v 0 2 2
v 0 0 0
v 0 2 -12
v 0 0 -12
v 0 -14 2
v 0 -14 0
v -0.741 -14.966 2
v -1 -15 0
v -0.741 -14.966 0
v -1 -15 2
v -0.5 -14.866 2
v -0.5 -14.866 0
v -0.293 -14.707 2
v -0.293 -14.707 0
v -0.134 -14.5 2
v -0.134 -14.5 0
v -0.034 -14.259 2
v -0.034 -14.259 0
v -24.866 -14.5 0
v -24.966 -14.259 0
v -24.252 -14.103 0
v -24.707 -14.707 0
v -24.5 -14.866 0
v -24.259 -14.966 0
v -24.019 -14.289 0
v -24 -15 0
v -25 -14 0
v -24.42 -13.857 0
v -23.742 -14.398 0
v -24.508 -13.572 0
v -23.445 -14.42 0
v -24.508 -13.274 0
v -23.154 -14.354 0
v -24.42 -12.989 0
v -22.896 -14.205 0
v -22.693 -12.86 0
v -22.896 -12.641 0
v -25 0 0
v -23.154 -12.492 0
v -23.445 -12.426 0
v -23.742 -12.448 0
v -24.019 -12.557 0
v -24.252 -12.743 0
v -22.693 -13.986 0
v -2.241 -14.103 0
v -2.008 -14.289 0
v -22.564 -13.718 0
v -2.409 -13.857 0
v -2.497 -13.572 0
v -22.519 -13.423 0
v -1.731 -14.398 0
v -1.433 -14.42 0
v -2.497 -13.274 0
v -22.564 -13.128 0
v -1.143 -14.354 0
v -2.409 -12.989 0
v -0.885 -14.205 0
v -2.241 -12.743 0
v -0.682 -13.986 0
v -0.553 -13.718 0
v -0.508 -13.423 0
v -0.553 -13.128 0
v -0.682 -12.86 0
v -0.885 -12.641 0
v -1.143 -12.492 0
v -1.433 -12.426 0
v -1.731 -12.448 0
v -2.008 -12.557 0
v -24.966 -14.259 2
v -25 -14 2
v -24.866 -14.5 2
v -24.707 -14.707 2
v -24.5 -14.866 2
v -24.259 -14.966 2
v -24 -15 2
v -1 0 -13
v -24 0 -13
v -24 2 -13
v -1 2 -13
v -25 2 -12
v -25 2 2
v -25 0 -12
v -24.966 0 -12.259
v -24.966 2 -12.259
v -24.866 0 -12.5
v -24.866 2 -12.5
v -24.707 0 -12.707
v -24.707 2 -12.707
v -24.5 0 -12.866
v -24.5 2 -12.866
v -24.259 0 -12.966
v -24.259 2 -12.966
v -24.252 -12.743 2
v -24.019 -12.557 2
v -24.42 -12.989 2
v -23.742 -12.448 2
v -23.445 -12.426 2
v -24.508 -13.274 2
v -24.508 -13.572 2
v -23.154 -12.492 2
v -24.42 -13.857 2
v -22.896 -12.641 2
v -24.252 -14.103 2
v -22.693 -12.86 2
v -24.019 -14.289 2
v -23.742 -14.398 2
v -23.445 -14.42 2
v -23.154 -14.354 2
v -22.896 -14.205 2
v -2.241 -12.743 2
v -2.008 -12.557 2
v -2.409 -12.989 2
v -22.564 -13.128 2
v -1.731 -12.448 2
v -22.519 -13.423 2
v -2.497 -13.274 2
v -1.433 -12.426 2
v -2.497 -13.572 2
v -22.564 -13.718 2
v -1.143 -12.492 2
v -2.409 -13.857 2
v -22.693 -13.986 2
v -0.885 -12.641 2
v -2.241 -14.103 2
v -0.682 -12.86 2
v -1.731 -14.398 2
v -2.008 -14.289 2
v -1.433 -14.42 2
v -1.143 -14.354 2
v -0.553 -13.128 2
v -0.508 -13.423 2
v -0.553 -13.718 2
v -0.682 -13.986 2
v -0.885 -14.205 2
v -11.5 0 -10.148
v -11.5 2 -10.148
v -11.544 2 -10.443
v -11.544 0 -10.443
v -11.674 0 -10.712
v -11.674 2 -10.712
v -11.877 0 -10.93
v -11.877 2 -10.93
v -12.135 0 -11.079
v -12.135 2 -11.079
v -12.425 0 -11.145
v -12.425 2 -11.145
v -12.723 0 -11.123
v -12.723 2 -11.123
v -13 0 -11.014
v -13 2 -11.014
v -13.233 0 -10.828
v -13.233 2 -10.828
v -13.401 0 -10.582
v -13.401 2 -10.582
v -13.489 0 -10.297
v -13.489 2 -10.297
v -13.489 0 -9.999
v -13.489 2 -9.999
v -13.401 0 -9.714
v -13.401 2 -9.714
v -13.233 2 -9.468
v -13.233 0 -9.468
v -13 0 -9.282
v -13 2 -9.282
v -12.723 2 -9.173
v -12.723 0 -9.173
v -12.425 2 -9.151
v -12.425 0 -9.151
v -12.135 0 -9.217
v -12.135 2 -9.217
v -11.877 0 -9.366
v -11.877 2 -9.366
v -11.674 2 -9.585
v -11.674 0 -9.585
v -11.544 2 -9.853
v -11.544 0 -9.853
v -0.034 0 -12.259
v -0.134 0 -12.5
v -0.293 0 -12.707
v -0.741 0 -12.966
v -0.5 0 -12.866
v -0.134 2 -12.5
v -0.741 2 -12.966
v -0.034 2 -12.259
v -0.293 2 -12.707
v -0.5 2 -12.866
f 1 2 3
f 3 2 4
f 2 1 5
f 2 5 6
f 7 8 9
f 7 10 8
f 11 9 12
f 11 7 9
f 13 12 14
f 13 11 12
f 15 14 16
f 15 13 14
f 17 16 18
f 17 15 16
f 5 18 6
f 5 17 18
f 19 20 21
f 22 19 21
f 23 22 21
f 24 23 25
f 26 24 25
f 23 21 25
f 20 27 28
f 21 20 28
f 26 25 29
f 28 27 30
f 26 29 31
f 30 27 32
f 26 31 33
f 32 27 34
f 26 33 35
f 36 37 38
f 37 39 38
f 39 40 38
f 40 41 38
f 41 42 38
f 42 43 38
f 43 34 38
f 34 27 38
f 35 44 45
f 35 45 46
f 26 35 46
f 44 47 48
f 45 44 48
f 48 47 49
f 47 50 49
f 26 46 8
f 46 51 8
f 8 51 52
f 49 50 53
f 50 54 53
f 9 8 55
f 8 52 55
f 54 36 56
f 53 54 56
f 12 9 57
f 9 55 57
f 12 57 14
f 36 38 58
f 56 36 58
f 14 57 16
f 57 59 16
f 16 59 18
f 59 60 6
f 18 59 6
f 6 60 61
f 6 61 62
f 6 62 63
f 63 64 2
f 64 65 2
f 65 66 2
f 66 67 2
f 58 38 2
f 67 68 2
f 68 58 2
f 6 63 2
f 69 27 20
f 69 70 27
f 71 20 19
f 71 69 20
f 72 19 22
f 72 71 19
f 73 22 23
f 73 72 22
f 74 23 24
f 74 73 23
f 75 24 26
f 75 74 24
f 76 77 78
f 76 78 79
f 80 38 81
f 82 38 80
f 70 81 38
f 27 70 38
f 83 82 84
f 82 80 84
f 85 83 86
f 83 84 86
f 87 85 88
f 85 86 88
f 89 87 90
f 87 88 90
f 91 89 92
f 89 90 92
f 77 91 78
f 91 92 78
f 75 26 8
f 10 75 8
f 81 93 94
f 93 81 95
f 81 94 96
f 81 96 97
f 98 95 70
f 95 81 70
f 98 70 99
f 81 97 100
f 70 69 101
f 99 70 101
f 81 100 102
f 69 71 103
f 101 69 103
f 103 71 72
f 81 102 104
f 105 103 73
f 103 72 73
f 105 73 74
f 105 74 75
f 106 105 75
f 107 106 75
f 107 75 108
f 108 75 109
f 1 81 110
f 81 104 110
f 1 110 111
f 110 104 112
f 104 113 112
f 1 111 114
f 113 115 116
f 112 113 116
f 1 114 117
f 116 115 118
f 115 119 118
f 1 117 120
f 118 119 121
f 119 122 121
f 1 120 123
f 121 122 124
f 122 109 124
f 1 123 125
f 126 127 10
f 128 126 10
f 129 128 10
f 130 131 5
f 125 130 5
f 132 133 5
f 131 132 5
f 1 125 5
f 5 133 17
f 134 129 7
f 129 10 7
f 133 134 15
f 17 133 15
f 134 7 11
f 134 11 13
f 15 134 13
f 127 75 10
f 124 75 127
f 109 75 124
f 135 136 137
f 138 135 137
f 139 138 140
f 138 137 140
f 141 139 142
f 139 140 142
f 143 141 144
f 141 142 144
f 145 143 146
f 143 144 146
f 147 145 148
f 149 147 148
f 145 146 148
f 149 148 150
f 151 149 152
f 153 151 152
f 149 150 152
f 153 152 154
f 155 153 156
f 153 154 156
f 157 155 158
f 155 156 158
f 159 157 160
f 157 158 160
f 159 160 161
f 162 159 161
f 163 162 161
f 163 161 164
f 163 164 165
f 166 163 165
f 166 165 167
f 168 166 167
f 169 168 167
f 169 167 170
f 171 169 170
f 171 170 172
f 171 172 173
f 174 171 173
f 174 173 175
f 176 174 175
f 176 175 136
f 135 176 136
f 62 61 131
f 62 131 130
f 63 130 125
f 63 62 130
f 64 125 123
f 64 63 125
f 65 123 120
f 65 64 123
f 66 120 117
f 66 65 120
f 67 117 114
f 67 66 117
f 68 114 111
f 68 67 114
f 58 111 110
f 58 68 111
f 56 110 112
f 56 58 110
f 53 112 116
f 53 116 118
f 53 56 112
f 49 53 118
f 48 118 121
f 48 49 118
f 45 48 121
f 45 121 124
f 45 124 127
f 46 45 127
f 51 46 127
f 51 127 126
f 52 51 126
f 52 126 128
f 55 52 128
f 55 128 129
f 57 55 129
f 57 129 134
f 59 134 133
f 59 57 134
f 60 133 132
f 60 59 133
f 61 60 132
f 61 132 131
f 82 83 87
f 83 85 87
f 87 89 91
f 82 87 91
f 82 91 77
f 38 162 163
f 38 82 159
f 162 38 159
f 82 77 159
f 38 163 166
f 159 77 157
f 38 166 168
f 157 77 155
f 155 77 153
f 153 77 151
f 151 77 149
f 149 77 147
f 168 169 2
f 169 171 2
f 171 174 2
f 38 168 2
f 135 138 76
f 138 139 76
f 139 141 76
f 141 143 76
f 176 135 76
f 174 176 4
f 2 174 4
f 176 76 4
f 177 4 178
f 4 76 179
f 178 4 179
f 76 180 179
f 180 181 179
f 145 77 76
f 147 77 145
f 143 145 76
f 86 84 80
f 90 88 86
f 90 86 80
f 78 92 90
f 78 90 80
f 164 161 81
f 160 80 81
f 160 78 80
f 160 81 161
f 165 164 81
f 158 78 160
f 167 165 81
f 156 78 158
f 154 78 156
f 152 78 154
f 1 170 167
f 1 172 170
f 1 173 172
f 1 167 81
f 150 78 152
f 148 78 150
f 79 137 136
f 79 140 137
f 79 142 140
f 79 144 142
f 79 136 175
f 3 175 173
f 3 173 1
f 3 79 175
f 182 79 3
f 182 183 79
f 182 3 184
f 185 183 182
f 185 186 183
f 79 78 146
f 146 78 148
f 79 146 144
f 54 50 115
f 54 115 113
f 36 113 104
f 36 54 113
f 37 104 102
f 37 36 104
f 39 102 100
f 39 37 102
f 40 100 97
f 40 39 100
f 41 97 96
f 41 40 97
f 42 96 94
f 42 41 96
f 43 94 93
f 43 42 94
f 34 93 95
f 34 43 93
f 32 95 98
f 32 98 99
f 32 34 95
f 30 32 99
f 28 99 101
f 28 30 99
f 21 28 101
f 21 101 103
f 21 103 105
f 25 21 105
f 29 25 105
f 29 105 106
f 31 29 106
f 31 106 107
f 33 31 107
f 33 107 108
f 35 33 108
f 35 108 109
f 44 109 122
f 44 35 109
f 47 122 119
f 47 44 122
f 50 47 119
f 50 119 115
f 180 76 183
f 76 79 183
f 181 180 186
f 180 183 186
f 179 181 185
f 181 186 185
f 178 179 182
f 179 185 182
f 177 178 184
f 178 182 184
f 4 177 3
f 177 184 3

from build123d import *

# Parameters (mm, degrees)
SKETCH1_W           = 25
SKETCH1_H           = 15
SKETCH1_R           = 1
BOSS_EXTRUDE1_DEPTH = 2
FILLET5_R           = 1
SKETCH2_W           = 25
SKETCH2_H           = 15
BOSS_EXTRUDE2_DEPTH = 2
FILLET6_R           = 1
FILLET7_R           = 1
SKETCH3_R           = 1
CUT_EXTRUDE1_DEPTH  = 32


with BuildPart() as part:
    # Sketch1 → Boss-Extrude1 (new body)
    with BuildSketch(Plane.XY):
        with Locations((-12.5, -7.5)):
            Rectangle(SKETCH1_W, SKETCH1_H)
        with Locations((-23.519315542, -13.423068426)):
            Circle(SKETCH1_R, mode=Mode.SUBTRACT)
        with Locations((-1.508210611, -13.423068426)):
            Circle(SKETCH1_R, mode=Mode.SUBTRACT)
    extrude(amount=BOSS_EXTRUDE1_DEPTH)

    # Fillet5
    fillet5_edges = [part.edges().sort_by_distance(p)[0] for p in [
        (0, -15, 1),
        (-25, -15, 1),
    ]]
    fillet(fillet5_edges, radius=FILLET5_R)

    # Sketch2 → Boss-Extrude2 (add)
    with BuildSketch(Plane(origin=(0, 0, 0), x_dir=(1, 0, 0), z_dir=(0, 1, 0))):
        with Locations((-12.5, 5.5)):
            Rectangle(SKETCH2_W, SKETCH2_H)
    extrude(amount=BOSS_EXTRUDE2_DEPTH)

    # Fillet6
    fillet6_edges = [part.edges().sort_by_distance(p)[0] for p in [
        (-25, 1, -13),
    ]]
    fillet(fillet6_edges, radius=FILLET6_R)

    # Fillet7
    fillet7_edges = [part.edges().sort_by_distance(p)[0] for p in [
        (0, 1, -13),
    ]]
    fillet(fillet7_edges, radius=FILLET7_R)

    # Sketch3 → Cut-Extrude1 (cut)
    with BuildSketch(Plane(origin=(0, 2, 0), x_dir=(1, 0, 0), z_dir=(0, 1, 0))):
        with Locations((-12.5, 10.148186861)):
            Circle(SKETCH3_R)
    extrude(amount=-CUT_EXTRUDE1_DEPTH, mode=Mode.SUBTRACT)


solid = part.part
